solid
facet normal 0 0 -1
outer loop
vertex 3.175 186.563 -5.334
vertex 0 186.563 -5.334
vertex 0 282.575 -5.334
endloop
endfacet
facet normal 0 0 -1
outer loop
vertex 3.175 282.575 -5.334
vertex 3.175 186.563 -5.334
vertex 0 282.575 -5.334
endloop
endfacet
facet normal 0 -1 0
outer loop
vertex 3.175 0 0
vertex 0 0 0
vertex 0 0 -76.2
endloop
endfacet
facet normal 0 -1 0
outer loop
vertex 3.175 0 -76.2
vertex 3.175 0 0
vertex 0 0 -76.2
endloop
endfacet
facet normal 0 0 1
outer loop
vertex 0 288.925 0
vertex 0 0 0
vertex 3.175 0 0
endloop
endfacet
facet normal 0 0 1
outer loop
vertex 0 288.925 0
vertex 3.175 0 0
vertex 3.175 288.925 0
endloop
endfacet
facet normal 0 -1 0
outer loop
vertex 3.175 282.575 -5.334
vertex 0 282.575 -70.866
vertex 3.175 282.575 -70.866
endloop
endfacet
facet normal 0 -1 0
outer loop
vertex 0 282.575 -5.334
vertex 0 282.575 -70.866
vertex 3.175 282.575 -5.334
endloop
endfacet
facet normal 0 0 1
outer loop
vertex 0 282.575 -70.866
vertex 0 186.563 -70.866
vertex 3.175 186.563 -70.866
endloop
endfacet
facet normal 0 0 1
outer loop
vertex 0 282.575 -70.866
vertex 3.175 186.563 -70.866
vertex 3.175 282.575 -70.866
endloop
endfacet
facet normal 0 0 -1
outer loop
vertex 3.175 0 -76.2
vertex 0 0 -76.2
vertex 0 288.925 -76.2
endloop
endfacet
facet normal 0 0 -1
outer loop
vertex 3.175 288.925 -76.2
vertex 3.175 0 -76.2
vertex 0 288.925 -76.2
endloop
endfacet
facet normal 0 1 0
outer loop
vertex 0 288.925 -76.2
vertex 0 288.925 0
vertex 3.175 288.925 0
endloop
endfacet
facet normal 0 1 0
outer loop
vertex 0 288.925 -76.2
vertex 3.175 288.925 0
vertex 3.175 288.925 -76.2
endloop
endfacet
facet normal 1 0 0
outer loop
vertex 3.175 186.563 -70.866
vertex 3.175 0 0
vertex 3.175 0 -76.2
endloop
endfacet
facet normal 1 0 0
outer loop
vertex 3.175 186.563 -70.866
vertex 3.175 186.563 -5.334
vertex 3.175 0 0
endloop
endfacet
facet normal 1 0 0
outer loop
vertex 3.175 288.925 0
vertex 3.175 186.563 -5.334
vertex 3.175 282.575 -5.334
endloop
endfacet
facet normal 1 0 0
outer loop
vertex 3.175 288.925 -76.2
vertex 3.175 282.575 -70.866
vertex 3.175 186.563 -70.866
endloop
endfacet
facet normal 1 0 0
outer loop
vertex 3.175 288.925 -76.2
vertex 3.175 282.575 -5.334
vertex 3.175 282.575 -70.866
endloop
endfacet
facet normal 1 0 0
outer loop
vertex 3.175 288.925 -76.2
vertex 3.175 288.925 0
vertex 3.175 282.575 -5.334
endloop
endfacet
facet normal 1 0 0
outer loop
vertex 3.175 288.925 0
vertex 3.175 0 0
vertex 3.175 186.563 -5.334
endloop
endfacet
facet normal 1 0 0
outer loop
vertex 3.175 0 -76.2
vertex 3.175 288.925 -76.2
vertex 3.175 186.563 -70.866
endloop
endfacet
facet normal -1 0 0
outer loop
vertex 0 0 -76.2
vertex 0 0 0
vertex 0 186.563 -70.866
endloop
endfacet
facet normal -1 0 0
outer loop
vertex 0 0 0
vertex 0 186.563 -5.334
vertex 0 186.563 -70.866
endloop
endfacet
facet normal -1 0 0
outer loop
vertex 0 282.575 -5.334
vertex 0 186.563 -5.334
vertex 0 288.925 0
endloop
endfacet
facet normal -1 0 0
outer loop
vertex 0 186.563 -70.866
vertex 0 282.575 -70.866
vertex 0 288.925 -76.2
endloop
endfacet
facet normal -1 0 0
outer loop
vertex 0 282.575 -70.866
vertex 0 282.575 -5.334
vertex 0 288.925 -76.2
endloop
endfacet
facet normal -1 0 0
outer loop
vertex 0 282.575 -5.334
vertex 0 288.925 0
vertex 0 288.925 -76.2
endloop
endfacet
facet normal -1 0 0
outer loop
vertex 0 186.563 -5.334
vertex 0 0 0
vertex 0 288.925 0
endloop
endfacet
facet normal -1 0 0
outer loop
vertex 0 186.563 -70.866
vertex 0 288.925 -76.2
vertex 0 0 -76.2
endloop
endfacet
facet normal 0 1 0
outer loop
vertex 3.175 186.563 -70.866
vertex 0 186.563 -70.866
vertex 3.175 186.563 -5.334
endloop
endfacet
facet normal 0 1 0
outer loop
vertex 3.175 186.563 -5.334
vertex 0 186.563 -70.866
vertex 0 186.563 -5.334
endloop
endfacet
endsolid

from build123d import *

# Parameters (mm, degrees)
SKETCH1_W           = 76.2
SKETCH1_H           = 288.925
BOSS_EXTRUDE1_DEPTH = 3.175
CUT_EXTRUDE1_REACH  = 300.821
SKETCH2_W           = 65.532
SKETCH2_H           = 96.012


with BuildPart() as part:
    # Sketch1 → Boss-Extrude1 (new body)
    with BuildSketch(Plane(origin=(0, 0, 0), x_dir=(0, 0, -1), z_dir=(1, 0, 0))):
        with Locations((38.1, 144.4625)):
            Rectangle(SKETCH1_W, SKETCH1_H)
    extrude(amount=BOSS_EXTRUDE1_DEPTH)

    # Sketch2 → Cut-Extrude1 (cut, up to next)
    with BuildSketch(Plane.ZY, mode=Mode.PRIVATE) as cut_extrude1_sk1:
        with Locations((-38.1, 234.569)):
            Rectangle(SKETCH2_W, SKETCH2_H)
    cut_extrude1_tool1 = extrude(cut_extrude1_sk1.sketch, amount=-CUT_EXTRUDE1_REACH, mode=Mode.PRIVATE) & part.part
    add(cut_extrude1_tool1.solids().sort_by_distance((0, 234.569, -38.1))[0], mode=Mode.SUBTRACT)


solid = part.part
